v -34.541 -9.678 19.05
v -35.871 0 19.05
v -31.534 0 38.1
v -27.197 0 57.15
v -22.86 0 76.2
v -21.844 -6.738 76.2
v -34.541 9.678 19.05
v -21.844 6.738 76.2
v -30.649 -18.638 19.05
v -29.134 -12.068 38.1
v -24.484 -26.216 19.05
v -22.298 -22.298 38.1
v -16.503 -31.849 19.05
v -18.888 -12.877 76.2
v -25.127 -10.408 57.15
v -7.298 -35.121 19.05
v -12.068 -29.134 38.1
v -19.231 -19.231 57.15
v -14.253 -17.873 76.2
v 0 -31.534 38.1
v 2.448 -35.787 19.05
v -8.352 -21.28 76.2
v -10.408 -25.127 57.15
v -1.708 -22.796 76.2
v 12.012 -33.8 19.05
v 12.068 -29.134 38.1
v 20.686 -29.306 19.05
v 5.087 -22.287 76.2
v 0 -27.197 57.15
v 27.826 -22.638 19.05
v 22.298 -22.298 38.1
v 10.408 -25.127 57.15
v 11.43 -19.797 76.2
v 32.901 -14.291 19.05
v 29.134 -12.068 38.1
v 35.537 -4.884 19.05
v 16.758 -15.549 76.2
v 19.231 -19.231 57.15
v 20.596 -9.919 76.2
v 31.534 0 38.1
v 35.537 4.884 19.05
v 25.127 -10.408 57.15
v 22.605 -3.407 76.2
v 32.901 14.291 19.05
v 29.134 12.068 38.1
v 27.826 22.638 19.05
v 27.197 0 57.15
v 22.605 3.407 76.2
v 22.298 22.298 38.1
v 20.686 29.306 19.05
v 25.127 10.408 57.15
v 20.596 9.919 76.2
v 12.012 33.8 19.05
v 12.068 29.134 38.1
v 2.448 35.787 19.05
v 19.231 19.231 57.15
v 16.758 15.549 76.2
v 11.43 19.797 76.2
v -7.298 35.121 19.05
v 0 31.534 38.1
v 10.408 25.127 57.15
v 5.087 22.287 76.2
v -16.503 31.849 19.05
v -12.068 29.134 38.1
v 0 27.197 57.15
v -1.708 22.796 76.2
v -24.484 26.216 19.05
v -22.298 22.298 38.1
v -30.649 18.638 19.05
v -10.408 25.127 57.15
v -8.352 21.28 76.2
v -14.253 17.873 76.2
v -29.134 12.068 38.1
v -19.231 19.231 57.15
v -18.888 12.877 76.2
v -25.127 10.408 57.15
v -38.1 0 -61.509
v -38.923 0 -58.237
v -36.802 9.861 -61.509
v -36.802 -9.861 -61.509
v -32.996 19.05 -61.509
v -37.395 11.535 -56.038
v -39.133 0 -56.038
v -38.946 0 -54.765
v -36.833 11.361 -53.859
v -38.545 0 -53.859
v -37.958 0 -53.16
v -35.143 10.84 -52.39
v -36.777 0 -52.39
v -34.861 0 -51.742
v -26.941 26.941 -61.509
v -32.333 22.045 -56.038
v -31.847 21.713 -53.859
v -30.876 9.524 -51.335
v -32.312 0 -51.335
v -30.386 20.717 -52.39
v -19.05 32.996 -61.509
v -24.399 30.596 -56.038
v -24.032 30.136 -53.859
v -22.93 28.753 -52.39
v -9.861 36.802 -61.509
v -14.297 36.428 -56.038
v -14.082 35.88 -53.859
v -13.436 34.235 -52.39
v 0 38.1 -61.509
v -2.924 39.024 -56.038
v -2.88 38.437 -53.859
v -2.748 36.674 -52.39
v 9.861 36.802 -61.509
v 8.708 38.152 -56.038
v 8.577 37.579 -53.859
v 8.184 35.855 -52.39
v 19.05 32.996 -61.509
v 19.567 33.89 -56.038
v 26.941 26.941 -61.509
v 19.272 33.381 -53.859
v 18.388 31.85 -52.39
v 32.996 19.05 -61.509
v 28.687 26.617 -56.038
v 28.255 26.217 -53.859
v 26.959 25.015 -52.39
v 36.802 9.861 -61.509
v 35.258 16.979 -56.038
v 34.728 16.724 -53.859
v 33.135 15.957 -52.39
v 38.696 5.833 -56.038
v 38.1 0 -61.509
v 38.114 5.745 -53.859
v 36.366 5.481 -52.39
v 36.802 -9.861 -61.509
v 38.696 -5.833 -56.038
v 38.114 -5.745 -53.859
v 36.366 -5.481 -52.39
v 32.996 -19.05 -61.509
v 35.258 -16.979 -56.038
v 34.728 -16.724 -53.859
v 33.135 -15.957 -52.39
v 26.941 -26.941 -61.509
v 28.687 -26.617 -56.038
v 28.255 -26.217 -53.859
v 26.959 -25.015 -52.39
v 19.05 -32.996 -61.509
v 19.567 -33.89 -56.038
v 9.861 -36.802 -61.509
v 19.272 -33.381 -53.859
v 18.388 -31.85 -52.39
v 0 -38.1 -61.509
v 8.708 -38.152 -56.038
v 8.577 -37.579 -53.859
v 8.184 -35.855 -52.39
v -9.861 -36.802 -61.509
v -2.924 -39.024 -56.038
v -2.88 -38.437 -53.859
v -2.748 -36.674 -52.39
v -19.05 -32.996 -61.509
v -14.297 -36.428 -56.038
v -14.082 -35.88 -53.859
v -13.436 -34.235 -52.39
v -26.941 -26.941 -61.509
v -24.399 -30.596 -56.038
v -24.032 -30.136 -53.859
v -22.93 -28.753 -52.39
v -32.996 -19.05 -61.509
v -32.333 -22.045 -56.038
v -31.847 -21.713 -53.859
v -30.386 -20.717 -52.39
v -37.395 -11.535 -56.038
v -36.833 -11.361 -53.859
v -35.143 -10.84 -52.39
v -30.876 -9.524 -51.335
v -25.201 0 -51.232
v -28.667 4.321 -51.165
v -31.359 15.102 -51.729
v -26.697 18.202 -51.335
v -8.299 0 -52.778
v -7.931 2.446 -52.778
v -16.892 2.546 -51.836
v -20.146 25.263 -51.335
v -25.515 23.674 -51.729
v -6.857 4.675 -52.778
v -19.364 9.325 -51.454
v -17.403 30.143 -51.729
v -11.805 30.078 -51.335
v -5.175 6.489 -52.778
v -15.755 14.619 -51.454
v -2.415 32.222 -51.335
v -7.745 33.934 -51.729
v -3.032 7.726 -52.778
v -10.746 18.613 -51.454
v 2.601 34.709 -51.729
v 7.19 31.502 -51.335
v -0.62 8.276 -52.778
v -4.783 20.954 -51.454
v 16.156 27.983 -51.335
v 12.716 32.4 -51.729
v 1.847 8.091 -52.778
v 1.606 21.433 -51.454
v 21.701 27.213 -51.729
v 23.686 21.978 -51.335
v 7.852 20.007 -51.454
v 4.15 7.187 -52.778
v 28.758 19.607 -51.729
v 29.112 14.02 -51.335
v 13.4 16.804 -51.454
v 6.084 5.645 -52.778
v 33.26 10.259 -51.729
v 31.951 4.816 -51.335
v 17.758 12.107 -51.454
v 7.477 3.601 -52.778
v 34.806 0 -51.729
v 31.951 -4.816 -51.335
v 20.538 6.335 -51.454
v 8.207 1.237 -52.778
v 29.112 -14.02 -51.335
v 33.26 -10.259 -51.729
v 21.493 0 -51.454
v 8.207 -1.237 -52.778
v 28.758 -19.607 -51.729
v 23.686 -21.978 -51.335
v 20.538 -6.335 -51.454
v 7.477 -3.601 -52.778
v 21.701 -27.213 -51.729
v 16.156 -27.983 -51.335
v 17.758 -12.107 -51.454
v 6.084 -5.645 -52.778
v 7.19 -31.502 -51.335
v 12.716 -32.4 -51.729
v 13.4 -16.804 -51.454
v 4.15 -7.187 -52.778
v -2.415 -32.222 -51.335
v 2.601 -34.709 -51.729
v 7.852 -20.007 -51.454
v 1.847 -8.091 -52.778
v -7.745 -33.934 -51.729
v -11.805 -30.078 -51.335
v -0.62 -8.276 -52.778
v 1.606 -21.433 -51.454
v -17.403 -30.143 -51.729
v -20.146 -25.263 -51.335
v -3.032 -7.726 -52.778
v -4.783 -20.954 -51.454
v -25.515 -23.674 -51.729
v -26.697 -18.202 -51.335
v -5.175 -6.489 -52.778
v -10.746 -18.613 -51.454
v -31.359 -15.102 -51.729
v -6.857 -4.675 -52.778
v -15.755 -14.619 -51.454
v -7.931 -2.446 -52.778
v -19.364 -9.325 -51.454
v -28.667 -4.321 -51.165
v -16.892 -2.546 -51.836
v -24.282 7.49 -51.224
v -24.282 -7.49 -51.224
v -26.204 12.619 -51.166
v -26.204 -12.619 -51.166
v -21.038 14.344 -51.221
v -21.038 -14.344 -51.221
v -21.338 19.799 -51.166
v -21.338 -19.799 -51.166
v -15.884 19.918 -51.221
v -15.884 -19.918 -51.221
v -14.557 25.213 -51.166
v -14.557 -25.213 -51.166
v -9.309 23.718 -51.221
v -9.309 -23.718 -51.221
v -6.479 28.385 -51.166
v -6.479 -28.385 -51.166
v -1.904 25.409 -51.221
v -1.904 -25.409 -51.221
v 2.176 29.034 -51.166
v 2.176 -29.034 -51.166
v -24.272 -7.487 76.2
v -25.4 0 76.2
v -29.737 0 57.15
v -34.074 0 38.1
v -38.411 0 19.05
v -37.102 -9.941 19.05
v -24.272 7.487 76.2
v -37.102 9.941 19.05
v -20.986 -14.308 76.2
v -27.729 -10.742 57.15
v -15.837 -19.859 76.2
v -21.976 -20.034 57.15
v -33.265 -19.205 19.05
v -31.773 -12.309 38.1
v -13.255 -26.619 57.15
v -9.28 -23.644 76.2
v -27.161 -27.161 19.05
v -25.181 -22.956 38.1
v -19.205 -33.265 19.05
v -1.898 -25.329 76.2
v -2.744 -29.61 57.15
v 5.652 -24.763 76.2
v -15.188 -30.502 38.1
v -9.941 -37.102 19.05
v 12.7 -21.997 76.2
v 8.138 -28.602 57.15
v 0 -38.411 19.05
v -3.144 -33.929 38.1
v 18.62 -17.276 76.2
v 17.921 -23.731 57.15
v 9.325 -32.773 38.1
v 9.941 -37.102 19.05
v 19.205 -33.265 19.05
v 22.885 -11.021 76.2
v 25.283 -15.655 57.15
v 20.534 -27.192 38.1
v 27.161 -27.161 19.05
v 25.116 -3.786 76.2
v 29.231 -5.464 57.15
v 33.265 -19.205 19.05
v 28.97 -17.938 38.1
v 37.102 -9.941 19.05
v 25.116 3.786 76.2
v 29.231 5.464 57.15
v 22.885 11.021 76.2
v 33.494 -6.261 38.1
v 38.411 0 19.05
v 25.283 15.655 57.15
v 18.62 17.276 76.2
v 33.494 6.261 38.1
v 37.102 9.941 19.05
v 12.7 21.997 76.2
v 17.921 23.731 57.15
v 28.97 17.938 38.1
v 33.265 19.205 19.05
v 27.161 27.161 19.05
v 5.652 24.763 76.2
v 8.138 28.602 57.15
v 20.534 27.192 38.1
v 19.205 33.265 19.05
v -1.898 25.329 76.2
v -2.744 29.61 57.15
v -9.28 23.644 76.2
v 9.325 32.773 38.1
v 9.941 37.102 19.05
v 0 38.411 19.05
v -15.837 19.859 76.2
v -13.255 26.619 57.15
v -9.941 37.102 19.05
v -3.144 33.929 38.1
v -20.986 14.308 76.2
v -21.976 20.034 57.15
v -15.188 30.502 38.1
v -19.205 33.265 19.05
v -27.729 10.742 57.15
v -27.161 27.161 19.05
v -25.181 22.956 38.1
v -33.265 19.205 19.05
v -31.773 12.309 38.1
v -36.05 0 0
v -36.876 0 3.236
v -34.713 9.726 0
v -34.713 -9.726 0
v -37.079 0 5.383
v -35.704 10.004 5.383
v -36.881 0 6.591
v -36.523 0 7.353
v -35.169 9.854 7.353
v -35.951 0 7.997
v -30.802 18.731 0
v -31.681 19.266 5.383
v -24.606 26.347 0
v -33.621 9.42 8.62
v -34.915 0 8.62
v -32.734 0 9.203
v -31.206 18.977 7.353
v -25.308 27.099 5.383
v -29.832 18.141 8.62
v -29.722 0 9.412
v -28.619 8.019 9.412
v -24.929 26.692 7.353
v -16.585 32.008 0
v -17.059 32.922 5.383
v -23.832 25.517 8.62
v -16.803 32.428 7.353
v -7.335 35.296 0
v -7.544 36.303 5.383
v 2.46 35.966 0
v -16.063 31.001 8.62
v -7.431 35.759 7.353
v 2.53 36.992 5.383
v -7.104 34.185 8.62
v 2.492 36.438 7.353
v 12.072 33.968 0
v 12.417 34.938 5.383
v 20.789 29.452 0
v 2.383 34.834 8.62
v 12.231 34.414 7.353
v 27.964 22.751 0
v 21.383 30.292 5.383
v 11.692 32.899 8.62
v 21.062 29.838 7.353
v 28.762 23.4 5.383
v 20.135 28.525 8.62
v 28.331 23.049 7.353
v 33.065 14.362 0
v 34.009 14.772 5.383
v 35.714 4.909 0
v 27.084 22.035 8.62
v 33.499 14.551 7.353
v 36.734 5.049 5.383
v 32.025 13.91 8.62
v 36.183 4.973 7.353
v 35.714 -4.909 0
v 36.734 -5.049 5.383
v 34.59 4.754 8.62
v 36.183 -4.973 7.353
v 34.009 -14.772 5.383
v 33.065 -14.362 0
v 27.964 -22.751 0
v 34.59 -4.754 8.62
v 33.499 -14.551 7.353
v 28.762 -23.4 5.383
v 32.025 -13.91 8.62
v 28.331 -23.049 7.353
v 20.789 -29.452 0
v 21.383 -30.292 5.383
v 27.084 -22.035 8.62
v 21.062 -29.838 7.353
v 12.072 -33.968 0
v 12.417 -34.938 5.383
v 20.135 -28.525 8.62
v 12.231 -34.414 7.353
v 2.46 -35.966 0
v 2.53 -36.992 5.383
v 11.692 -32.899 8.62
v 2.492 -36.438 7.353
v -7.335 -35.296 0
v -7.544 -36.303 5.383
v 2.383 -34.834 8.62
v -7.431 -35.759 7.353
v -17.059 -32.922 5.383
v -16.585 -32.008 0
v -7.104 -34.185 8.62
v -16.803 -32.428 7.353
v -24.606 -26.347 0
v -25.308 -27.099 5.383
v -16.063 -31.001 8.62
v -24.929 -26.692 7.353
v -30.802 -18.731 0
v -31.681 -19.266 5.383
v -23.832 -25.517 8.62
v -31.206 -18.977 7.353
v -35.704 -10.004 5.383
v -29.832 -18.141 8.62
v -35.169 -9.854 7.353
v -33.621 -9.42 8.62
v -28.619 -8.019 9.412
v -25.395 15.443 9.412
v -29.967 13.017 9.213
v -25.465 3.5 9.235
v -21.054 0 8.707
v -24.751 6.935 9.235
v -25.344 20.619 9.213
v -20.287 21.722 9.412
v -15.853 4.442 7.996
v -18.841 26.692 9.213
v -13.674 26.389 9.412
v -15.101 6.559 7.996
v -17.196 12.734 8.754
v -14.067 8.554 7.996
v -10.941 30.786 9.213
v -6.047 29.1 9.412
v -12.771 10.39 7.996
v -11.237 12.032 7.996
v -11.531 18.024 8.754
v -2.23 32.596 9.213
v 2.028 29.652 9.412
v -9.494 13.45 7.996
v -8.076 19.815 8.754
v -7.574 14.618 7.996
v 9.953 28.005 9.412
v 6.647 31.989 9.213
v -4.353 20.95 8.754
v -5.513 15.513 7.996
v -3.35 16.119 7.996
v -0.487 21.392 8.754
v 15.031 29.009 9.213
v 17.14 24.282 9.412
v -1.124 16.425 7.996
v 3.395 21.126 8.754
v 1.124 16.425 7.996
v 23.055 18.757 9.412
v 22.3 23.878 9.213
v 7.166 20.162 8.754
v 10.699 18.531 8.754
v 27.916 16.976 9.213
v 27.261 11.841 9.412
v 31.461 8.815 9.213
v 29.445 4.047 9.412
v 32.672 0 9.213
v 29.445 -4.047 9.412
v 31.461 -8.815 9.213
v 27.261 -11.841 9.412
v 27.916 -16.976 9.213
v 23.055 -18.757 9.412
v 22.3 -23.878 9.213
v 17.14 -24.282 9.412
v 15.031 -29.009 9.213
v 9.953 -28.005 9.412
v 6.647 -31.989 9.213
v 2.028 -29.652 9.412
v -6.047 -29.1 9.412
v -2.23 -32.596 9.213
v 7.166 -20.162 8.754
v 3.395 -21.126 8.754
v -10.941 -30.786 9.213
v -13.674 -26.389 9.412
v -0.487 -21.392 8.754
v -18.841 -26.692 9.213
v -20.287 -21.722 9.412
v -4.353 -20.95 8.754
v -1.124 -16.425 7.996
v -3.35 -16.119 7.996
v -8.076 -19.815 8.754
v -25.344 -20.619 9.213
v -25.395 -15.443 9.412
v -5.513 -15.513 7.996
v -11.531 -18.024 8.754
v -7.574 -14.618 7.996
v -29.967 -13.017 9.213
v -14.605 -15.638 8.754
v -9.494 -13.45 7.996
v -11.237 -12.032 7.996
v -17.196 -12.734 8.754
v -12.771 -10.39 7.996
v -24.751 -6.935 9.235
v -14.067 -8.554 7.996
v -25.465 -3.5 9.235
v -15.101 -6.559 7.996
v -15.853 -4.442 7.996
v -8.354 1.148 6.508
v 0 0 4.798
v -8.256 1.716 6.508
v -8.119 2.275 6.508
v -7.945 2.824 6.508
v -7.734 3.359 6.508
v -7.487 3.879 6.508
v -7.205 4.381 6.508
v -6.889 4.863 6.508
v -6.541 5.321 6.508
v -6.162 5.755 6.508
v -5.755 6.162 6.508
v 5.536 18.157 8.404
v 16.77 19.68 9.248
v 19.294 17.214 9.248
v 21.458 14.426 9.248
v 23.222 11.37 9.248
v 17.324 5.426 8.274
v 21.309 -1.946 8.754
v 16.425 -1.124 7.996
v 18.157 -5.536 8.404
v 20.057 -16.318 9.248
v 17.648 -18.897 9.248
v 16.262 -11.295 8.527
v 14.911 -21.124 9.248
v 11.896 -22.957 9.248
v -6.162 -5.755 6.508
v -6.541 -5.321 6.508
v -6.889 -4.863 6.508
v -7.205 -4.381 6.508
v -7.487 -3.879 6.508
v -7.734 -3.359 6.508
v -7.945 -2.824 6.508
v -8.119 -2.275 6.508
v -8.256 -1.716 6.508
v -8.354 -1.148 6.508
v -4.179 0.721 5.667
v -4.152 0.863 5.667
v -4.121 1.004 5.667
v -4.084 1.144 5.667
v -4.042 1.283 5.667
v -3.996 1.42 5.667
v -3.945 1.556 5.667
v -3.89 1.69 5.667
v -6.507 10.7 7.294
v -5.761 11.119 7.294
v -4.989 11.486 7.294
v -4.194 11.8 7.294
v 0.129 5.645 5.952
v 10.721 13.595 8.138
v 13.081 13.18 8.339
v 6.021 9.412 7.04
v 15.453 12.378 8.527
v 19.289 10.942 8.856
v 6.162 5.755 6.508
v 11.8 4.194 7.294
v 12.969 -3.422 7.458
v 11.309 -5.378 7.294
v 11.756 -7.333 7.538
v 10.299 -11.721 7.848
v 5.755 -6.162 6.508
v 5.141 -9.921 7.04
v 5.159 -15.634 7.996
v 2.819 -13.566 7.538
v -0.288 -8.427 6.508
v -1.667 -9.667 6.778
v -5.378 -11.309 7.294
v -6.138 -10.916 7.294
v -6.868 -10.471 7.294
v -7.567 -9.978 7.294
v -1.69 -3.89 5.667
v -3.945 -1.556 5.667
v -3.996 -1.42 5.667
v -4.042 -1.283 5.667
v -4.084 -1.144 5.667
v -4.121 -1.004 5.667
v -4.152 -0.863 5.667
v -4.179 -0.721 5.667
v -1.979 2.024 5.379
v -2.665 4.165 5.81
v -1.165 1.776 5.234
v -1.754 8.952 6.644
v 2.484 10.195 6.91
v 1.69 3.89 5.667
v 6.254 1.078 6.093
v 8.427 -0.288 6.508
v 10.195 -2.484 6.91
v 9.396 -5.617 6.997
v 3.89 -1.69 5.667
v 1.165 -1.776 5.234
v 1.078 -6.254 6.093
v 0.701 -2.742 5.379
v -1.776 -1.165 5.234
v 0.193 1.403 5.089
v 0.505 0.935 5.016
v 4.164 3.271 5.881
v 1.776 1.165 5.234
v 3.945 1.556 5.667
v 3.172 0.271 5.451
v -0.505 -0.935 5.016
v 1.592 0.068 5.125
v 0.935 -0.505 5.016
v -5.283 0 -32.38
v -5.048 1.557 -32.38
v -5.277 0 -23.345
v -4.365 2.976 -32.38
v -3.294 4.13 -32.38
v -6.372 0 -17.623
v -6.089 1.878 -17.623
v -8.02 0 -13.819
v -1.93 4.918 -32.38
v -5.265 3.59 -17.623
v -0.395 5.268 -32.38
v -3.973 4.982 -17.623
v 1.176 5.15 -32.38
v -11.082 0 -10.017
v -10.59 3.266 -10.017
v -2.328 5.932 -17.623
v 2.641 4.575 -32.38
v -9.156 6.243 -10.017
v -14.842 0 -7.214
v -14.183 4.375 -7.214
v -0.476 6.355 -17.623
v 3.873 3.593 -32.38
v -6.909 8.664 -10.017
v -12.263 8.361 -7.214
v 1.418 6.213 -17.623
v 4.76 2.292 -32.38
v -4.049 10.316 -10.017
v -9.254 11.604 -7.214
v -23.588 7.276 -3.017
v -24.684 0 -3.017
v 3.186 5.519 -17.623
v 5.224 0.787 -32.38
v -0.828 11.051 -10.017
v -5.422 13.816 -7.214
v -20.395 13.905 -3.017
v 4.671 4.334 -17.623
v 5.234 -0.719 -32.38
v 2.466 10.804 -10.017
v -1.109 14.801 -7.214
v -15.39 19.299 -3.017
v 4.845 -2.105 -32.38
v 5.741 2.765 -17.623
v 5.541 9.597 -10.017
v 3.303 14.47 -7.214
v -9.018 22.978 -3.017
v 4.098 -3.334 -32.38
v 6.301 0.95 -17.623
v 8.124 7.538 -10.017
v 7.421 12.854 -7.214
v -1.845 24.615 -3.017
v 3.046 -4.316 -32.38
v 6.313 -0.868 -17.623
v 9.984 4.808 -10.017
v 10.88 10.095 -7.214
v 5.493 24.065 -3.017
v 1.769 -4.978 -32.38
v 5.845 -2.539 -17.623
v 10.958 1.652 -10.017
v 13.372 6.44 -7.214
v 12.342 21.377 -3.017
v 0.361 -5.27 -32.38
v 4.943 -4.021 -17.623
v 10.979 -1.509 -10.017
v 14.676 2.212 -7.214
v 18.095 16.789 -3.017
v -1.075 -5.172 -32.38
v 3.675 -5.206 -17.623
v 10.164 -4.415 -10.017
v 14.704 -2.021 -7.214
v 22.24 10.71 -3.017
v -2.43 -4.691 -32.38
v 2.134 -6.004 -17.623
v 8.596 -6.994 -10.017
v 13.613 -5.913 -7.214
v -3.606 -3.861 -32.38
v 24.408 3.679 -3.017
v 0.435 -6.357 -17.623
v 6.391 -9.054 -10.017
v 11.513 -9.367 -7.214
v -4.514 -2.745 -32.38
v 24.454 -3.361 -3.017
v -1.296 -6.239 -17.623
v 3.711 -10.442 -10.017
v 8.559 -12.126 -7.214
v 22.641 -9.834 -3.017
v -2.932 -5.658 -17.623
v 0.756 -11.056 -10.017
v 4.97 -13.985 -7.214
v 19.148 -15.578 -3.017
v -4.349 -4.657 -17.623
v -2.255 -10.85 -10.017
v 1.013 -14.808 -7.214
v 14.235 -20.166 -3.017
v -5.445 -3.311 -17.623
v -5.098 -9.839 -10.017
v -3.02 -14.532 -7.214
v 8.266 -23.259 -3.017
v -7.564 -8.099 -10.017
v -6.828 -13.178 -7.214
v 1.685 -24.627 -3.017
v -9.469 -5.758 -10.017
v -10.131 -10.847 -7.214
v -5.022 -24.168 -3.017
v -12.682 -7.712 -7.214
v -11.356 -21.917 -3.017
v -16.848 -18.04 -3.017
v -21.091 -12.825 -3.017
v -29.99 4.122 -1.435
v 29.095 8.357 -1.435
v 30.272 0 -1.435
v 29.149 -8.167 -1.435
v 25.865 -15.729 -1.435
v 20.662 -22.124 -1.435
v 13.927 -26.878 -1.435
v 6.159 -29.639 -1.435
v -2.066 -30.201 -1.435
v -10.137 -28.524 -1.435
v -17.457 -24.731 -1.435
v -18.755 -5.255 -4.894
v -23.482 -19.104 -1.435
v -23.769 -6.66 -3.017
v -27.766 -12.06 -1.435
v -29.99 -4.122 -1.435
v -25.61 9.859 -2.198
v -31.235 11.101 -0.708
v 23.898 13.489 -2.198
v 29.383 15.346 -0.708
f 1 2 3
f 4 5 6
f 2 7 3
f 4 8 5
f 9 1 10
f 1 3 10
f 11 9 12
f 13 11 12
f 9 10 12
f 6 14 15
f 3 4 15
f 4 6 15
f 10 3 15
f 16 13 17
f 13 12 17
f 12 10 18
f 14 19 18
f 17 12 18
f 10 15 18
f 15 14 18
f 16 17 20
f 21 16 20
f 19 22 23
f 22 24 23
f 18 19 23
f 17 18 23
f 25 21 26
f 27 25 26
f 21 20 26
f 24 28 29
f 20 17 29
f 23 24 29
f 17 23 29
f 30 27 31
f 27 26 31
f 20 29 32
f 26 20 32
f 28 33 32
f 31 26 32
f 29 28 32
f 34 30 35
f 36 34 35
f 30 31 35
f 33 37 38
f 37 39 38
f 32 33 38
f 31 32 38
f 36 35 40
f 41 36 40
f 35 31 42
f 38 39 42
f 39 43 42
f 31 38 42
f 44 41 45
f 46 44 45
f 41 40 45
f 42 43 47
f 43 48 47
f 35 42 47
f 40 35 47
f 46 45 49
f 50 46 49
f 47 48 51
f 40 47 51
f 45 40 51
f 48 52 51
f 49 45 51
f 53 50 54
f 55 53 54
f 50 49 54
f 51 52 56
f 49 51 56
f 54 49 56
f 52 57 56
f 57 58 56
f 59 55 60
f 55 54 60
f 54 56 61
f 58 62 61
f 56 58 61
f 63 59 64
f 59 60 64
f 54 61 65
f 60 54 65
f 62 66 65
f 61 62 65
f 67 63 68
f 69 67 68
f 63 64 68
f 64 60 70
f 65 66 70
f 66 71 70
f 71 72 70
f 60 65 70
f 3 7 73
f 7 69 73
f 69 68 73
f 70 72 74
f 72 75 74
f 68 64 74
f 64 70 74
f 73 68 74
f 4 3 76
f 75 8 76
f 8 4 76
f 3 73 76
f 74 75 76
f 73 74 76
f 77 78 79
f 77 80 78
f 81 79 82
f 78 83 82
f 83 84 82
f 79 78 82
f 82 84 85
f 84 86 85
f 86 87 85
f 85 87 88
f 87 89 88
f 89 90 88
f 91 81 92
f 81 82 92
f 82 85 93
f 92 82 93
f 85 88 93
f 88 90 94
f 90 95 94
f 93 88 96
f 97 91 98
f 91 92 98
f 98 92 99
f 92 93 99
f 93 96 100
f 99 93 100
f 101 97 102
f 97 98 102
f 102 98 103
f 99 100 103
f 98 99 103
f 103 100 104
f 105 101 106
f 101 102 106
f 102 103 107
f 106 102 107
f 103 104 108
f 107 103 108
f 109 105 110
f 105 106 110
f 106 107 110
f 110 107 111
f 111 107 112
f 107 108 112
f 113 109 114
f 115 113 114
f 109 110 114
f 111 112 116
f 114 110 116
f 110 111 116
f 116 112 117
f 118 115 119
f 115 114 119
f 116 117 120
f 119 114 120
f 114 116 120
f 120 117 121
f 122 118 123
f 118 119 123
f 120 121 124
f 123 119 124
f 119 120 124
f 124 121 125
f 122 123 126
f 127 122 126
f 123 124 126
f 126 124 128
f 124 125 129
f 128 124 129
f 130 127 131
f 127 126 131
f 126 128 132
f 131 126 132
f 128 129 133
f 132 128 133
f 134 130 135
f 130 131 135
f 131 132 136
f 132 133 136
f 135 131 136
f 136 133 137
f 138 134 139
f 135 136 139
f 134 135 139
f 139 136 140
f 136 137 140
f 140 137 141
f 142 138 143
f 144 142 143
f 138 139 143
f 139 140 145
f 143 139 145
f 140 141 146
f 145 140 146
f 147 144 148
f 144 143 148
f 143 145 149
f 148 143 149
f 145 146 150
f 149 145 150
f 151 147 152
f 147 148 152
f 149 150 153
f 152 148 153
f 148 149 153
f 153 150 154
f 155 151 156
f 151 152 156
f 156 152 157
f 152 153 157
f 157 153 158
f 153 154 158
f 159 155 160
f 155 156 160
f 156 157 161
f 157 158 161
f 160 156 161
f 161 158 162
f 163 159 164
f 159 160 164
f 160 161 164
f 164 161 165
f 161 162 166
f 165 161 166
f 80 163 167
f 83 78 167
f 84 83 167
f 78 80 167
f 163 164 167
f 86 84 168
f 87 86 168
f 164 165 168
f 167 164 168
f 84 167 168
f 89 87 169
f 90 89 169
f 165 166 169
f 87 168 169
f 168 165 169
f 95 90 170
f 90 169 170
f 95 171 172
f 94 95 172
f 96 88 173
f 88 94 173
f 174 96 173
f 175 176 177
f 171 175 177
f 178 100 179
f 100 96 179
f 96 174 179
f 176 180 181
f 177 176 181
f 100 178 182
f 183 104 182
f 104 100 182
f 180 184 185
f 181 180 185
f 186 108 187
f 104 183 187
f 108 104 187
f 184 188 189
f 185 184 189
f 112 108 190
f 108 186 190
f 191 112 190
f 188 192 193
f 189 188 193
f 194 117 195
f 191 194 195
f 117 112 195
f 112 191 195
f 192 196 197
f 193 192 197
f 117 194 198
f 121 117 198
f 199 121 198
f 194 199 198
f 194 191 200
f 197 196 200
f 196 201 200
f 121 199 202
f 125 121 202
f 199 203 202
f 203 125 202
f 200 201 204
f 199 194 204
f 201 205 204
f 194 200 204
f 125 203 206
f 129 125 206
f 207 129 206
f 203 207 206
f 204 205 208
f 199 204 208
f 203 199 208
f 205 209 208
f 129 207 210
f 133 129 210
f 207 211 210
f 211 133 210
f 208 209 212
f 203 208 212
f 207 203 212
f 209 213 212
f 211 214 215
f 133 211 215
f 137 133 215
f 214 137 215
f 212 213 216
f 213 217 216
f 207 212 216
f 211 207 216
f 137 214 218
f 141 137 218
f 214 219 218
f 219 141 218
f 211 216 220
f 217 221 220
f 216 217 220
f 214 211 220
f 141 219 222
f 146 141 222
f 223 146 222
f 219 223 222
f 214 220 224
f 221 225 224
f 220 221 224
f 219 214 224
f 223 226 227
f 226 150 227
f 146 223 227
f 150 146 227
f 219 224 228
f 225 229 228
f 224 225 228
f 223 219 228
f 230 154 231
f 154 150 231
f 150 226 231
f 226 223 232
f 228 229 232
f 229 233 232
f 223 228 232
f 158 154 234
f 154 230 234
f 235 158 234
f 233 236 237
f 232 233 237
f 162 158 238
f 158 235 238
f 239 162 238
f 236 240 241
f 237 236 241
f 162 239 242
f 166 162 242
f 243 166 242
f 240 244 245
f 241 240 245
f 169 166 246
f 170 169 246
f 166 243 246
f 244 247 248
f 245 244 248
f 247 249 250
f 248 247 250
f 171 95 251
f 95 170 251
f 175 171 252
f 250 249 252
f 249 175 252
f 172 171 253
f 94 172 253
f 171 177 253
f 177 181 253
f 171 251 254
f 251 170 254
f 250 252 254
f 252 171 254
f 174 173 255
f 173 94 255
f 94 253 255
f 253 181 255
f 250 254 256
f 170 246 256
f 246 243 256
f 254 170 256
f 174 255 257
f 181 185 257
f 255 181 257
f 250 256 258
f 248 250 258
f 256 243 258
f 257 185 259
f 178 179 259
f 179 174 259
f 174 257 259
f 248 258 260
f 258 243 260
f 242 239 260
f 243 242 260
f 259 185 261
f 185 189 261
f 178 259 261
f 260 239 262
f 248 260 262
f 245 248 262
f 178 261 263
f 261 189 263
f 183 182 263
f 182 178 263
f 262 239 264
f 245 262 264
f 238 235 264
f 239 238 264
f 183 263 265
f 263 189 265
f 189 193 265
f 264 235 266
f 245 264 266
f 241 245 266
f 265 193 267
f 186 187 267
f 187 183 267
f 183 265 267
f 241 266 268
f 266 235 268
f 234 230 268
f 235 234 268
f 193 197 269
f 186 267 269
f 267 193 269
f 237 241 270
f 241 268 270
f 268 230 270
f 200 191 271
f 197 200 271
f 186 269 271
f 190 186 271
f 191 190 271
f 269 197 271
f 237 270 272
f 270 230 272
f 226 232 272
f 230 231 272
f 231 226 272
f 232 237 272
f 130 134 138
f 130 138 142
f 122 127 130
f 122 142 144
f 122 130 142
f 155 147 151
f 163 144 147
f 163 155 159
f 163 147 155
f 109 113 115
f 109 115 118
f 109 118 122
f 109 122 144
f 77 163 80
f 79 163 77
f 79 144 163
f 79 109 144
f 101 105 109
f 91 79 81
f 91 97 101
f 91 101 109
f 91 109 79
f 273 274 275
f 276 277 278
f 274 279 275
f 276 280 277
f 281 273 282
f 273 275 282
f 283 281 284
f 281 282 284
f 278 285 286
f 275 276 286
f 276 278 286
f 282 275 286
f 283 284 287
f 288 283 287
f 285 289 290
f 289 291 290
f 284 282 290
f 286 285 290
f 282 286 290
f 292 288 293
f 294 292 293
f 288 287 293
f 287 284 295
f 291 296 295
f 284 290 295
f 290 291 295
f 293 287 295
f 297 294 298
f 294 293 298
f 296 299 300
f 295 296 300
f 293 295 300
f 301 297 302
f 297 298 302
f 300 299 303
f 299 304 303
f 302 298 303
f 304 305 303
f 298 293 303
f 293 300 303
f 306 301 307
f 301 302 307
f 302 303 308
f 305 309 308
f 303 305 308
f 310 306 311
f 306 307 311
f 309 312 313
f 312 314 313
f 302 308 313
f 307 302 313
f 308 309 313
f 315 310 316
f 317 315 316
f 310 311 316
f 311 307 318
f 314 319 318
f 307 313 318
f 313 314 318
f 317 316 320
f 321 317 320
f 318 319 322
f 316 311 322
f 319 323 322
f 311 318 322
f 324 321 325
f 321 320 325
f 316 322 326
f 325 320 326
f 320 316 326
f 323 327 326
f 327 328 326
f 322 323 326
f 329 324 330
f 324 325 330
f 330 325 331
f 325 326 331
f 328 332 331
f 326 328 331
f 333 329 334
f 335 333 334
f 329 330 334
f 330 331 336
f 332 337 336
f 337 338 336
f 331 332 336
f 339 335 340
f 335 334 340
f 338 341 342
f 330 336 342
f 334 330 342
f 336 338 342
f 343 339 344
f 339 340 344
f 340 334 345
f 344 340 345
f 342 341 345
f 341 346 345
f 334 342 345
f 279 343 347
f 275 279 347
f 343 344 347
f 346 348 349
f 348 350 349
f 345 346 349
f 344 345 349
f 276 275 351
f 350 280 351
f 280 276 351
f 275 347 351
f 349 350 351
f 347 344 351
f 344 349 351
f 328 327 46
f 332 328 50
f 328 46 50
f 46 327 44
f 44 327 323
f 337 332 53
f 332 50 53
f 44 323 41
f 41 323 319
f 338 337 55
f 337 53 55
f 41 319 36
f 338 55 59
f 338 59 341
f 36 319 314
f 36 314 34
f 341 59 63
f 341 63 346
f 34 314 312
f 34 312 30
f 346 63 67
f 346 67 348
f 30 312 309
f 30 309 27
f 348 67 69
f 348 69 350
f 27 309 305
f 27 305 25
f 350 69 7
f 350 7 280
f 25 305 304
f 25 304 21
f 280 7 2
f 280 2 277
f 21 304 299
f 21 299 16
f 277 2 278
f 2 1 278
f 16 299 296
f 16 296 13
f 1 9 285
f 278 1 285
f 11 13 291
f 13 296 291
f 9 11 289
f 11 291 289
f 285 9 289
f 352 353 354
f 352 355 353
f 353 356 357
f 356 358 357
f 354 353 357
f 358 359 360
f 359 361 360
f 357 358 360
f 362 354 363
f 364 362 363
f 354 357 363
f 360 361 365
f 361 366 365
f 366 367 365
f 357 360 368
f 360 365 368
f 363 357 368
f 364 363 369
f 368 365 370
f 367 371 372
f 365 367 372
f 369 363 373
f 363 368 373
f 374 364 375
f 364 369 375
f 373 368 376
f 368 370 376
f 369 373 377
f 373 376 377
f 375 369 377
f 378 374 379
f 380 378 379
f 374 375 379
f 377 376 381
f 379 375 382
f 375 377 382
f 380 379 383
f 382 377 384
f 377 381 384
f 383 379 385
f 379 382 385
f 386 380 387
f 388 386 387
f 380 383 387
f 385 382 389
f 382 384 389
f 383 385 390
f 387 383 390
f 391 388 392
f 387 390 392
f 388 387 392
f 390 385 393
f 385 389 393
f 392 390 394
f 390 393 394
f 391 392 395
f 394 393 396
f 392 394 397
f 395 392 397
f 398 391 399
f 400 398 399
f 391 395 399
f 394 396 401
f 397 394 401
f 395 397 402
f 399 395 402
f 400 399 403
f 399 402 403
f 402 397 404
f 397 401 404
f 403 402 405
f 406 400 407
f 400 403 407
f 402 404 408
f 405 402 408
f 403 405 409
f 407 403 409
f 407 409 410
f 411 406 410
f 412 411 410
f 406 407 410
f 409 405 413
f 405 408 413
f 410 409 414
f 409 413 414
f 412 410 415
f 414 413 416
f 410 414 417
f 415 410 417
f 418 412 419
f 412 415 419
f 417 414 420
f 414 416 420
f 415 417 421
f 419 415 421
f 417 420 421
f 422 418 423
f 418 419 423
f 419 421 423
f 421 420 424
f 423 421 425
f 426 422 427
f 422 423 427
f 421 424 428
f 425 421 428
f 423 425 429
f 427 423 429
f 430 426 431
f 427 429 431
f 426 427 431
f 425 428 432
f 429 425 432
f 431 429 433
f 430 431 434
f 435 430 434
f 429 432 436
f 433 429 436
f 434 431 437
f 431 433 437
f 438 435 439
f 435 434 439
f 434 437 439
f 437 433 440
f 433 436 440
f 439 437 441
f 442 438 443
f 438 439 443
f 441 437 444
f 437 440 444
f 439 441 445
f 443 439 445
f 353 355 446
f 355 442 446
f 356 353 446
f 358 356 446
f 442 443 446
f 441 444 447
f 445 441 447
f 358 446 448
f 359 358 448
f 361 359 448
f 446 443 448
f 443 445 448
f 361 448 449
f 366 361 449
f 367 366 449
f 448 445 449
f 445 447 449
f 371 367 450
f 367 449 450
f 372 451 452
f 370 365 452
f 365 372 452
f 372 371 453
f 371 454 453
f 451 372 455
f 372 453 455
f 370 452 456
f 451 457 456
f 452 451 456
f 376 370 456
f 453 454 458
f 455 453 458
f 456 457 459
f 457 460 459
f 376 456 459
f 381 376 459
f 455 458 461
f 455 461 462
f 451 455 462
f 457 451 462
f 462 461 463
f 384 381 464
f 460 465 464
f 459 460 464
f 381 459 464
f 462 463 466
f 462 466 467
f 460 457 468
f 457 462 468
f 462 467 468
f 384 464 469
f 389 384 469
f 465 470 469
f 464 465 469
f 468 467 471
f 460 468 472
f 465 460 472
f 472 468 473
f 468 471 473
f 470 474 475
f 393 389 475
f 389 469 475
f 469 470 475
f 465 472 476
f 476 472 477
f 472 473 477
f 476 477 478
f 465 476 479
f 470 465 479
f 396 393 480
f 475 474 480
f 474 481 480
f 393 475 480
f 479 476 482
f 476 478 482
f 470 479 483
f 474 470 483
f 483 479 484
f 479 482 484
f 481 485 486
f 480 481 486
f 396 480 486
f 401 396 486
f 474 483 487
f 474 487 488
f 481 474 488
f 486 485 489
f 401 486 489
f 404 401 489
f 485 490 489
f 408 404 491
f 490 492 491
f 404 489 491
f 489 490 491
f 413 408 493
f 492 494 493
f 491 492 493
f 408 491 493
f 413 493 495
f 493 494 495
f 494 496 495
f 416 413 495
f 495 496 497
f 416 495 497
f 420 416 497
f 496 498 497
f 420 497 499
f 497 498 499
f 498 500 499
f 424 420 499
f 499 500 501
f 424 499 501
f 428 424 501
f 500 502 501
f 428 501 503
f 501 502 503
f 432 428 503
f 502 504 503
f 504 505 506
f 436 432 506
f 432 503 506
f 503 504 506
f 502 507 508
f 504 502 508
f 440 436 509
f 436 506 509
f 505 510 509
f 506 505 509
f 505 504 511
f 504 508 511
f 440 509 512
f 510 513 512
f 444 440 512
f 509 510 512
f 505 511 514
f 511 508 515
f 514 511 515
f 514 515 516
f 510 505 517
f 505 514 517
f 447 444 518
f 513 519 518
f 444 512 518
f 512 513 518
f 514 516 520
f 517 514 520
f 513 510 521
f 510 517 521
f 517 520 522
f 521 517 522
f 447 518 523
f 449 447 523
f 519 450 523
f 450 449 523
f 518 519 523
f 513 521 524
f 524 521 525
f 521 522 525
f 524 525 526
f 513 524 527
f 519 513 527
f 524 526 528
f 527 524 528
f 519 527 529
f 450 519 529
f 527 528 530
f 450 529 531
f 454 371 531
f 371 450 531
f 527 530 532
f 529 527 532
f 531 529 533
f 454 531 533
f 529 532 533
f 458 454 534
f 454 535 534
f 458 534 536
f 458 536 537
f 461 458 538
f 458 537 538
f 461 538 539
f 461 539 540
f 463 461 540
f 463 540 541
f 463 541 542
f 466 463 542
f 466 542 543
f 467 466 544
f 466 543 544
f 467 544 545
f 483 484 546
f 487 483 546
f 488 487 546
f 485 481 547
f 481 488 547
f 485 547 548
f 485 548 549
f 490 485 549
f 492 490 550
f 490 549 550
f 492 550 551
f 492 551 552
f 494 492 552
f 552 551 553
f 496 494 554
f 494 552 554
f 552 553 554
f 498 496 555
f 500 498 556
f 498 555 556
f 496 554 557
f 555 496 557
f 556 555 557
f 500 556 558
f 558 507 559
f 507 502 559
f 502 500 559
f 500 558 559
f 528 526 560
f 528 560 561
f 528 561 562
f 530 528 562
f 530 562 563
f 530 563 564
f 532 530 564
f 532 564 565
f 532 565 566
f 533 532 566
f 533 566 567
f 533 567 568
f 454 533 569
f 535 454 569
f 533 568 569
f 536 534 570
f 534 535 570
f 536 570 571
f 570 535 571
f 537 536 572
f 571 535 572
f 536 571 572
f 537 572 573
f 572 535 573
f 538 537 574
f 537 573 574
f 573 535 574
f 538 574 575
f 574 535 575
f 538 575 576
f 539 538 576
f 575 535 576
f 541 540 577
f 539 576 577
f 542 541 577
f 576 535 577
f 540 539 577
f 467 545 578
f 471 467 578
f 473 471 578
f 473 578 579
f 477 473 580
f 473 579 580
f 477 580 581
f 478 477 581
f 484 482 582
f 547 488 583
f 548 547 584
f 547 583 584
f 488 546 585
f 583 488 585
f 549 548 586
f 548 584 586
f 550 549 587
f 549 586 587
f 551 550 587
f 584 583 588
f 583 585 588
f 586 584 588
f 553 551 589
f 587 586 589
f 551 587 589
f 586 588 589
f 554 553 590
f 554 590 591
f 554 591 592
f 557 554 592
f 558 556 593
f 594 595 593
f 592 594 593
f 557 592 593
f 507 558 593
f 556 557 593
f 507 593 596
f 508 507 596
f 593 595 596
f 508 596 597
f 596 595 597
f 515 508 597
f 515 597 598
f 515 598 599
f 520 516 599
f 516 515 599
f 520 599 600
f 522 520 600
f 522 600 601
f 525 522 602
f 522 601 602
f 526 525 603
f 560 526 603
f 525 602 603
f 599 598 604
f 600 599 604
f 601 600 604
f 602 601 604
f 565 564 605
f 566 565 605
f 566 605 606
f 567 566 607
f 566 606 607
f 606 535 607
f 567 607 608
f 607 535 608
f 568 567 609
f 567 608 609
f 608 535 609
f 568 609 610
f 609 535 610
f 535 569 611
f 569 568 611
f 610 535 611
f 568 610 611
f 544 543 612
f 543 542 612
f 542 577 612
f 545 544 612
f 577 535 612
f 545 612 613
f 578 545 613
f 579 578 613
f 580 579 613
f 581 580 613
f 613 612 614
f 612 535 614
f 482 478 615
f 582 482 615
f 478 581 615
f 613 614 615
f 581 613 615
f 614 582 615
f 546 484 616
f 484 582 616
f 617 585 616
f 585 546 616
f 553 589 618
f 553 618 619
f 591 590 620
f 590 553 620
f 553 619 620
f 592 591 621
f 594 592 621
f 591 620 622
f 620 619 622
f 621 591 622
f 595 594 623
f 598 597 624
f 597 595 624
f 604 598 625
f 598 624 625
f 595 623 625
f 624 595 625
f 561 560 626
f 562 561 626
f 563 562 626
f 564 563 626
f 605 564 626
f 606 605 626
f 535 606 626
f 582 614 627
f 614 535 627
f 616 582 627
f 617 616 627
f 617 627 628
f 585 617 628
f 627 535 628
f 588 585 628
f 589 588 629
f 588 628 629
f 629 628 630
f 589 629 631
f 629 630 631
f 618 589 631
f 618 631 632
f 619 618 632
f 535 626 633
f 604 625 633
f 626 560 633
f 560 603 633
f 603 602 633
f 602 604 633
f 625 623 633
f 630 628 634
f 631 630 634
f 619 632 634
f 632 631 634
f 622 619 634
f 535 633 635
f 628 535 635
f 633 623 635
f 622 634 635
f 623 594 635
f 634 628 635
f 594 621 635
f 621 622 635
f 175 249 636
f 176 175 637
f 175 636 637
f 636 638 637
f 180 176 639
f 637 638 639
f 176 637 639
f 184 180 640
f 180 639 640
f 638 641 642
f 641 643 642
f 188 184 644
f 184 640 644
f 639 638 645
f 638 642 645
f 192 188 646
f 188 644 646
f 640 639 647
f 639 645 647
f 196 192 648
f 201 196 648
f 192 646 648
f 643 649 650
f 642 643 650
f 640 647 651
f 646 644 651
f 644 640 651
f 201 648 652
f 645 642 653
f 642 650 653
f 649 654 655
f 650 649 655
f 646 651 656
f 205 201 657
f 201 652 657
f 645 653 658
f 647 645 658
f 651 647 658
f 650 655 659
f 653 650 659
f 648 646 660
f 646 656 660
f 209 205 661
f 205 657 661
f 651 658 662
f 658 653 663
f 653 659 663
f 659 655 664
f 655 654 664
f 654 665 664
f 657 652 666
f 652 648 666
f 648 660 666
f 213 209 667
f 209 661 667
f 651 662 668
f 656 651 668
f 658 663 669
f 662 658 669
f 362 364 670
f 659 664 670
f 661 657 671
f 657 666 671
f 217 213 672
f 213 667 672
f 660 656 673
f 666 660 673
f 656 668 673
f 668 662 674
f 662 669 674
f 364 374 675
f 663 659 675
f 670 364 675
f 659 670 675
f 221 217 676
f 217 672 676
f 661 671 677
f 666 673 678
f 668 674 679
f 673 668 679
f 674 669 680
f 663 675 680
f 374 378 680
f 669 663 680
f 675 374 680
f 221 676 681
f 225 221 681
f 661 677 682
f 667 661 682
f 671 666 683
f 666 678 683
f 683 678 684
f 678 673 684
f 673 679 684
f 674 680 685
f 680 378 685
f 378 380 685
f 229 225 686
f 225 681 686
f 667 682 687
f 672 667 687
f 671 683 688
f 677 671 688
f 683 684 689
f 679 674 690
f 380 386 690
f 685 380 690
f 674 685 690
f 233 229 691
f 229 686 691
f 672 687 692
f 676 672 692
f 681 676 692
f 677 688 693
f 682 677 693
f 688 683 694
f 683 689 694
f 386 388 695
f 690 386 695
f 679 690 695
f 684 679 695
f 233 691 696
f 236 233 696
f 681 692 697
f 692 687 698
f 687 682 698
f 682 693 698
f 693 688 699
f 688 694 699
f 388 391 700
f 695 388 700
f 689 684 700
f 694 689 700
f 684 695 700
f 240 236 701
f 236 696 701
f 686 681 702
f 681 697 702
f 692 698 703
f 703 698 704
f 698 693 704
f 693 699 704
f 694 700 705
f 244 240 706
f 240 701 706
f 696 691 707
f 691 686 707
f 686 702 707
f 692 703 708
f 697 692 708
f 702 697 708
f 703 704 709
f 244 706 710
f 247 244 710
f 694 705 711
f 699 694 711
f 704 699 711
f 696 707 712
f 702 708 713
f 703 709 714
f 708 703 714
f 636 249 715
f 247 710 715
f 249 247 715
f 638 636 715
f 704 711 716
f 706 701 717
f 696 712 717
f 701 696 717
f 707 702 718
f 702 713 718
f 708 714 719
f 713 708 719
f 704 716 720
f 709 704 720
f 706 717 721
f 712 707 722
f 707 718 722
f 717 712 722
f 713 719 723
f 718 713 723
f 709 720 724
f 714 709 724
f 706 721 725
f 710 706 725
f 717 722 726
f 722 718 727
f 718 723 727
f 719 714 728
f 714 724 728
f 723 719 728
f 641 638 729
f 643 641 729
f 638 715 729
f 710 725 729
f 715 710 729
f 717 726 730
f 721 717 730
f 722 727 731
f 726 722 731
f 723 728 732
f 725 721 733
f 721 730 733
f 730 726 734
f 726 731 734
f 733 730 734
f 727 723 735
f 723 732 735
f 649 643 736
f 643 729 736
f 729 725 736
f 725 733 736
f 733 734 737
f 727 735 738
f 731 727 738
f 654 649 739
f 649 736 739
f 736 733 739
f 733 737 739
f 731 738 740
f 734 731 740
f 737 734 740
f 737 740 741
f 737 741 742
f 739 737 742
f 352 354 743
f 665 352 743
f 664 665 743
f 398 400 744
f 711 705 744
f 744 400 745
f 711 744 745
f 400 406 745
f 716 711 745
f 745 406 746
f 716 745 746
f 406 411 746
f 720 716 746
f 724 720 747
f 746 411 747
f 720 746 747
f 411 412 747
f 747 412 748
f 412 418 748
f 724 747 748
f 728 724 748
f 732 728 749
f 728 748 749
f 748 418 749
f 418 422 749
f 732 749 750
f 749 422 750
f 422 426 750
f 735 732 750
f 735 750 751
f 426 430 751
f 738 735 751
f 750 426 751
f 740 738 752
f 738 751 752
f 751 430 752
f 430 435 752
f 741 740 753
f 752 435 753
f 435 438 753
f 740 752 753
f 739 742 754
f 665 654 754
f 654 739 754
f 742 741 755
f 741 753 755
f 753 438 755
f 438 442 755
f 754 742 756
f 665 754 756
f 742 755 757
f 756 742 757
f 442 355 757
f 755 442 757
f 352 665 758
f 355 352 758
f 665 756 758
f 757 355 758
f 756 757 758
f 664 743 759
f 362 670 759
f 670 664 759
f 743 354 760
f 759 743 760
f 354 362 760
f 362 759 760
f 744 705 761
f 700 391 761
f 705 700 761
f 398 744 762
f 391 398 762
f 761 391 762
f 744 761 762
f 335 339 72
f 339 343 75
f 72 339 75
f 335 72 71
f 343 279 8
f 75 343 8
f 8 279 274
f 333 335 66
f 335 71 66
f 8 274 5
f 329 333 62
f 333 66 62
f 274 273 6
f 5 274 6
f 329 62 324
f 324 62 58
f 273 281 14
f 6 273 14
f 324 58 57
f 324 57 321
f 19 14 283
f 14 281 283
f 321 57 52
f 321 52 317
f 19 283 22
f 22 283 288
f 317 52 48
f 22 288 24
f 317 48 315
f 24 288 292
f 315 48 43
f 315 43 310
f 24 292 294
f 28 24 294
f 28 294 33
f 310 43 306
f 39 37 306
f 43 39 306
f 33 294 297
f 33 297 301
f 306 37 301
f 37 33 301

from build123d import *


with BuildPart() as f1:
    # F0 (on Front) → F1 (revolve)
    with BuildSketch(Plane.XZ):
        with BuildLine():
            Line((-38.1, -61.508895377), (0, -61.508895377))
            Line((0, -61.508895377), (0, 4.798006732))
            add(Edge.make_bspline(
                [(-36.049887538, 0), (-36.944901427, 3.1340381109), (-39.7541423684, 12.9710565994), (-16.1107167165, 8.1102072545), (0, 4.798006732)],
                knots=[0, 0, 0, 0, 0.3185963424, 1, 1, 1, 1], degree=3))
            add(Edge.make_bspline(
                [(-8.299253881, -52.7780689299), (-5.5216129063, -37.4868704098), (-0.28887447, -8.6801084975), (-24.6296681712, -2.7719780472), (-36.049887538, 0)],
                knots=[0, 0, 0, 0, 0.5308197626, 1, 1, 1, 1], degree=3))
            add(Edge.make_bspline(
                [(-38.1, -61.508895377), (-38.9974191644, -58.3160103919), (-41.6045155832, -49.0403459756), (-21.4899496862, -51.2977272669), (-8.299253881, -52.7780689299)],
                knots=[0, 0, 0, 0, 0.3442217012, 1, 1, 1, 1], degree=3))
        make_face()
    revolve(axis=Axis((0, 0, -28.3554443225), (0, 0, -1)))


with BuildPart() as f3:
    # F2 (on Front) → F3 (revolve)
    with BuildSketch(Plane.XZ):
        Polygon((-22.86, 76.2), (-25.4, 76.2), (-38.4109914303, 19.05), (-35.8709914303, 19.05), align=None)
    revolve(axis=Axis((0, 0, 38.1), (0, 0, 1)))


solid = Compound([f1.part, f3.part])
